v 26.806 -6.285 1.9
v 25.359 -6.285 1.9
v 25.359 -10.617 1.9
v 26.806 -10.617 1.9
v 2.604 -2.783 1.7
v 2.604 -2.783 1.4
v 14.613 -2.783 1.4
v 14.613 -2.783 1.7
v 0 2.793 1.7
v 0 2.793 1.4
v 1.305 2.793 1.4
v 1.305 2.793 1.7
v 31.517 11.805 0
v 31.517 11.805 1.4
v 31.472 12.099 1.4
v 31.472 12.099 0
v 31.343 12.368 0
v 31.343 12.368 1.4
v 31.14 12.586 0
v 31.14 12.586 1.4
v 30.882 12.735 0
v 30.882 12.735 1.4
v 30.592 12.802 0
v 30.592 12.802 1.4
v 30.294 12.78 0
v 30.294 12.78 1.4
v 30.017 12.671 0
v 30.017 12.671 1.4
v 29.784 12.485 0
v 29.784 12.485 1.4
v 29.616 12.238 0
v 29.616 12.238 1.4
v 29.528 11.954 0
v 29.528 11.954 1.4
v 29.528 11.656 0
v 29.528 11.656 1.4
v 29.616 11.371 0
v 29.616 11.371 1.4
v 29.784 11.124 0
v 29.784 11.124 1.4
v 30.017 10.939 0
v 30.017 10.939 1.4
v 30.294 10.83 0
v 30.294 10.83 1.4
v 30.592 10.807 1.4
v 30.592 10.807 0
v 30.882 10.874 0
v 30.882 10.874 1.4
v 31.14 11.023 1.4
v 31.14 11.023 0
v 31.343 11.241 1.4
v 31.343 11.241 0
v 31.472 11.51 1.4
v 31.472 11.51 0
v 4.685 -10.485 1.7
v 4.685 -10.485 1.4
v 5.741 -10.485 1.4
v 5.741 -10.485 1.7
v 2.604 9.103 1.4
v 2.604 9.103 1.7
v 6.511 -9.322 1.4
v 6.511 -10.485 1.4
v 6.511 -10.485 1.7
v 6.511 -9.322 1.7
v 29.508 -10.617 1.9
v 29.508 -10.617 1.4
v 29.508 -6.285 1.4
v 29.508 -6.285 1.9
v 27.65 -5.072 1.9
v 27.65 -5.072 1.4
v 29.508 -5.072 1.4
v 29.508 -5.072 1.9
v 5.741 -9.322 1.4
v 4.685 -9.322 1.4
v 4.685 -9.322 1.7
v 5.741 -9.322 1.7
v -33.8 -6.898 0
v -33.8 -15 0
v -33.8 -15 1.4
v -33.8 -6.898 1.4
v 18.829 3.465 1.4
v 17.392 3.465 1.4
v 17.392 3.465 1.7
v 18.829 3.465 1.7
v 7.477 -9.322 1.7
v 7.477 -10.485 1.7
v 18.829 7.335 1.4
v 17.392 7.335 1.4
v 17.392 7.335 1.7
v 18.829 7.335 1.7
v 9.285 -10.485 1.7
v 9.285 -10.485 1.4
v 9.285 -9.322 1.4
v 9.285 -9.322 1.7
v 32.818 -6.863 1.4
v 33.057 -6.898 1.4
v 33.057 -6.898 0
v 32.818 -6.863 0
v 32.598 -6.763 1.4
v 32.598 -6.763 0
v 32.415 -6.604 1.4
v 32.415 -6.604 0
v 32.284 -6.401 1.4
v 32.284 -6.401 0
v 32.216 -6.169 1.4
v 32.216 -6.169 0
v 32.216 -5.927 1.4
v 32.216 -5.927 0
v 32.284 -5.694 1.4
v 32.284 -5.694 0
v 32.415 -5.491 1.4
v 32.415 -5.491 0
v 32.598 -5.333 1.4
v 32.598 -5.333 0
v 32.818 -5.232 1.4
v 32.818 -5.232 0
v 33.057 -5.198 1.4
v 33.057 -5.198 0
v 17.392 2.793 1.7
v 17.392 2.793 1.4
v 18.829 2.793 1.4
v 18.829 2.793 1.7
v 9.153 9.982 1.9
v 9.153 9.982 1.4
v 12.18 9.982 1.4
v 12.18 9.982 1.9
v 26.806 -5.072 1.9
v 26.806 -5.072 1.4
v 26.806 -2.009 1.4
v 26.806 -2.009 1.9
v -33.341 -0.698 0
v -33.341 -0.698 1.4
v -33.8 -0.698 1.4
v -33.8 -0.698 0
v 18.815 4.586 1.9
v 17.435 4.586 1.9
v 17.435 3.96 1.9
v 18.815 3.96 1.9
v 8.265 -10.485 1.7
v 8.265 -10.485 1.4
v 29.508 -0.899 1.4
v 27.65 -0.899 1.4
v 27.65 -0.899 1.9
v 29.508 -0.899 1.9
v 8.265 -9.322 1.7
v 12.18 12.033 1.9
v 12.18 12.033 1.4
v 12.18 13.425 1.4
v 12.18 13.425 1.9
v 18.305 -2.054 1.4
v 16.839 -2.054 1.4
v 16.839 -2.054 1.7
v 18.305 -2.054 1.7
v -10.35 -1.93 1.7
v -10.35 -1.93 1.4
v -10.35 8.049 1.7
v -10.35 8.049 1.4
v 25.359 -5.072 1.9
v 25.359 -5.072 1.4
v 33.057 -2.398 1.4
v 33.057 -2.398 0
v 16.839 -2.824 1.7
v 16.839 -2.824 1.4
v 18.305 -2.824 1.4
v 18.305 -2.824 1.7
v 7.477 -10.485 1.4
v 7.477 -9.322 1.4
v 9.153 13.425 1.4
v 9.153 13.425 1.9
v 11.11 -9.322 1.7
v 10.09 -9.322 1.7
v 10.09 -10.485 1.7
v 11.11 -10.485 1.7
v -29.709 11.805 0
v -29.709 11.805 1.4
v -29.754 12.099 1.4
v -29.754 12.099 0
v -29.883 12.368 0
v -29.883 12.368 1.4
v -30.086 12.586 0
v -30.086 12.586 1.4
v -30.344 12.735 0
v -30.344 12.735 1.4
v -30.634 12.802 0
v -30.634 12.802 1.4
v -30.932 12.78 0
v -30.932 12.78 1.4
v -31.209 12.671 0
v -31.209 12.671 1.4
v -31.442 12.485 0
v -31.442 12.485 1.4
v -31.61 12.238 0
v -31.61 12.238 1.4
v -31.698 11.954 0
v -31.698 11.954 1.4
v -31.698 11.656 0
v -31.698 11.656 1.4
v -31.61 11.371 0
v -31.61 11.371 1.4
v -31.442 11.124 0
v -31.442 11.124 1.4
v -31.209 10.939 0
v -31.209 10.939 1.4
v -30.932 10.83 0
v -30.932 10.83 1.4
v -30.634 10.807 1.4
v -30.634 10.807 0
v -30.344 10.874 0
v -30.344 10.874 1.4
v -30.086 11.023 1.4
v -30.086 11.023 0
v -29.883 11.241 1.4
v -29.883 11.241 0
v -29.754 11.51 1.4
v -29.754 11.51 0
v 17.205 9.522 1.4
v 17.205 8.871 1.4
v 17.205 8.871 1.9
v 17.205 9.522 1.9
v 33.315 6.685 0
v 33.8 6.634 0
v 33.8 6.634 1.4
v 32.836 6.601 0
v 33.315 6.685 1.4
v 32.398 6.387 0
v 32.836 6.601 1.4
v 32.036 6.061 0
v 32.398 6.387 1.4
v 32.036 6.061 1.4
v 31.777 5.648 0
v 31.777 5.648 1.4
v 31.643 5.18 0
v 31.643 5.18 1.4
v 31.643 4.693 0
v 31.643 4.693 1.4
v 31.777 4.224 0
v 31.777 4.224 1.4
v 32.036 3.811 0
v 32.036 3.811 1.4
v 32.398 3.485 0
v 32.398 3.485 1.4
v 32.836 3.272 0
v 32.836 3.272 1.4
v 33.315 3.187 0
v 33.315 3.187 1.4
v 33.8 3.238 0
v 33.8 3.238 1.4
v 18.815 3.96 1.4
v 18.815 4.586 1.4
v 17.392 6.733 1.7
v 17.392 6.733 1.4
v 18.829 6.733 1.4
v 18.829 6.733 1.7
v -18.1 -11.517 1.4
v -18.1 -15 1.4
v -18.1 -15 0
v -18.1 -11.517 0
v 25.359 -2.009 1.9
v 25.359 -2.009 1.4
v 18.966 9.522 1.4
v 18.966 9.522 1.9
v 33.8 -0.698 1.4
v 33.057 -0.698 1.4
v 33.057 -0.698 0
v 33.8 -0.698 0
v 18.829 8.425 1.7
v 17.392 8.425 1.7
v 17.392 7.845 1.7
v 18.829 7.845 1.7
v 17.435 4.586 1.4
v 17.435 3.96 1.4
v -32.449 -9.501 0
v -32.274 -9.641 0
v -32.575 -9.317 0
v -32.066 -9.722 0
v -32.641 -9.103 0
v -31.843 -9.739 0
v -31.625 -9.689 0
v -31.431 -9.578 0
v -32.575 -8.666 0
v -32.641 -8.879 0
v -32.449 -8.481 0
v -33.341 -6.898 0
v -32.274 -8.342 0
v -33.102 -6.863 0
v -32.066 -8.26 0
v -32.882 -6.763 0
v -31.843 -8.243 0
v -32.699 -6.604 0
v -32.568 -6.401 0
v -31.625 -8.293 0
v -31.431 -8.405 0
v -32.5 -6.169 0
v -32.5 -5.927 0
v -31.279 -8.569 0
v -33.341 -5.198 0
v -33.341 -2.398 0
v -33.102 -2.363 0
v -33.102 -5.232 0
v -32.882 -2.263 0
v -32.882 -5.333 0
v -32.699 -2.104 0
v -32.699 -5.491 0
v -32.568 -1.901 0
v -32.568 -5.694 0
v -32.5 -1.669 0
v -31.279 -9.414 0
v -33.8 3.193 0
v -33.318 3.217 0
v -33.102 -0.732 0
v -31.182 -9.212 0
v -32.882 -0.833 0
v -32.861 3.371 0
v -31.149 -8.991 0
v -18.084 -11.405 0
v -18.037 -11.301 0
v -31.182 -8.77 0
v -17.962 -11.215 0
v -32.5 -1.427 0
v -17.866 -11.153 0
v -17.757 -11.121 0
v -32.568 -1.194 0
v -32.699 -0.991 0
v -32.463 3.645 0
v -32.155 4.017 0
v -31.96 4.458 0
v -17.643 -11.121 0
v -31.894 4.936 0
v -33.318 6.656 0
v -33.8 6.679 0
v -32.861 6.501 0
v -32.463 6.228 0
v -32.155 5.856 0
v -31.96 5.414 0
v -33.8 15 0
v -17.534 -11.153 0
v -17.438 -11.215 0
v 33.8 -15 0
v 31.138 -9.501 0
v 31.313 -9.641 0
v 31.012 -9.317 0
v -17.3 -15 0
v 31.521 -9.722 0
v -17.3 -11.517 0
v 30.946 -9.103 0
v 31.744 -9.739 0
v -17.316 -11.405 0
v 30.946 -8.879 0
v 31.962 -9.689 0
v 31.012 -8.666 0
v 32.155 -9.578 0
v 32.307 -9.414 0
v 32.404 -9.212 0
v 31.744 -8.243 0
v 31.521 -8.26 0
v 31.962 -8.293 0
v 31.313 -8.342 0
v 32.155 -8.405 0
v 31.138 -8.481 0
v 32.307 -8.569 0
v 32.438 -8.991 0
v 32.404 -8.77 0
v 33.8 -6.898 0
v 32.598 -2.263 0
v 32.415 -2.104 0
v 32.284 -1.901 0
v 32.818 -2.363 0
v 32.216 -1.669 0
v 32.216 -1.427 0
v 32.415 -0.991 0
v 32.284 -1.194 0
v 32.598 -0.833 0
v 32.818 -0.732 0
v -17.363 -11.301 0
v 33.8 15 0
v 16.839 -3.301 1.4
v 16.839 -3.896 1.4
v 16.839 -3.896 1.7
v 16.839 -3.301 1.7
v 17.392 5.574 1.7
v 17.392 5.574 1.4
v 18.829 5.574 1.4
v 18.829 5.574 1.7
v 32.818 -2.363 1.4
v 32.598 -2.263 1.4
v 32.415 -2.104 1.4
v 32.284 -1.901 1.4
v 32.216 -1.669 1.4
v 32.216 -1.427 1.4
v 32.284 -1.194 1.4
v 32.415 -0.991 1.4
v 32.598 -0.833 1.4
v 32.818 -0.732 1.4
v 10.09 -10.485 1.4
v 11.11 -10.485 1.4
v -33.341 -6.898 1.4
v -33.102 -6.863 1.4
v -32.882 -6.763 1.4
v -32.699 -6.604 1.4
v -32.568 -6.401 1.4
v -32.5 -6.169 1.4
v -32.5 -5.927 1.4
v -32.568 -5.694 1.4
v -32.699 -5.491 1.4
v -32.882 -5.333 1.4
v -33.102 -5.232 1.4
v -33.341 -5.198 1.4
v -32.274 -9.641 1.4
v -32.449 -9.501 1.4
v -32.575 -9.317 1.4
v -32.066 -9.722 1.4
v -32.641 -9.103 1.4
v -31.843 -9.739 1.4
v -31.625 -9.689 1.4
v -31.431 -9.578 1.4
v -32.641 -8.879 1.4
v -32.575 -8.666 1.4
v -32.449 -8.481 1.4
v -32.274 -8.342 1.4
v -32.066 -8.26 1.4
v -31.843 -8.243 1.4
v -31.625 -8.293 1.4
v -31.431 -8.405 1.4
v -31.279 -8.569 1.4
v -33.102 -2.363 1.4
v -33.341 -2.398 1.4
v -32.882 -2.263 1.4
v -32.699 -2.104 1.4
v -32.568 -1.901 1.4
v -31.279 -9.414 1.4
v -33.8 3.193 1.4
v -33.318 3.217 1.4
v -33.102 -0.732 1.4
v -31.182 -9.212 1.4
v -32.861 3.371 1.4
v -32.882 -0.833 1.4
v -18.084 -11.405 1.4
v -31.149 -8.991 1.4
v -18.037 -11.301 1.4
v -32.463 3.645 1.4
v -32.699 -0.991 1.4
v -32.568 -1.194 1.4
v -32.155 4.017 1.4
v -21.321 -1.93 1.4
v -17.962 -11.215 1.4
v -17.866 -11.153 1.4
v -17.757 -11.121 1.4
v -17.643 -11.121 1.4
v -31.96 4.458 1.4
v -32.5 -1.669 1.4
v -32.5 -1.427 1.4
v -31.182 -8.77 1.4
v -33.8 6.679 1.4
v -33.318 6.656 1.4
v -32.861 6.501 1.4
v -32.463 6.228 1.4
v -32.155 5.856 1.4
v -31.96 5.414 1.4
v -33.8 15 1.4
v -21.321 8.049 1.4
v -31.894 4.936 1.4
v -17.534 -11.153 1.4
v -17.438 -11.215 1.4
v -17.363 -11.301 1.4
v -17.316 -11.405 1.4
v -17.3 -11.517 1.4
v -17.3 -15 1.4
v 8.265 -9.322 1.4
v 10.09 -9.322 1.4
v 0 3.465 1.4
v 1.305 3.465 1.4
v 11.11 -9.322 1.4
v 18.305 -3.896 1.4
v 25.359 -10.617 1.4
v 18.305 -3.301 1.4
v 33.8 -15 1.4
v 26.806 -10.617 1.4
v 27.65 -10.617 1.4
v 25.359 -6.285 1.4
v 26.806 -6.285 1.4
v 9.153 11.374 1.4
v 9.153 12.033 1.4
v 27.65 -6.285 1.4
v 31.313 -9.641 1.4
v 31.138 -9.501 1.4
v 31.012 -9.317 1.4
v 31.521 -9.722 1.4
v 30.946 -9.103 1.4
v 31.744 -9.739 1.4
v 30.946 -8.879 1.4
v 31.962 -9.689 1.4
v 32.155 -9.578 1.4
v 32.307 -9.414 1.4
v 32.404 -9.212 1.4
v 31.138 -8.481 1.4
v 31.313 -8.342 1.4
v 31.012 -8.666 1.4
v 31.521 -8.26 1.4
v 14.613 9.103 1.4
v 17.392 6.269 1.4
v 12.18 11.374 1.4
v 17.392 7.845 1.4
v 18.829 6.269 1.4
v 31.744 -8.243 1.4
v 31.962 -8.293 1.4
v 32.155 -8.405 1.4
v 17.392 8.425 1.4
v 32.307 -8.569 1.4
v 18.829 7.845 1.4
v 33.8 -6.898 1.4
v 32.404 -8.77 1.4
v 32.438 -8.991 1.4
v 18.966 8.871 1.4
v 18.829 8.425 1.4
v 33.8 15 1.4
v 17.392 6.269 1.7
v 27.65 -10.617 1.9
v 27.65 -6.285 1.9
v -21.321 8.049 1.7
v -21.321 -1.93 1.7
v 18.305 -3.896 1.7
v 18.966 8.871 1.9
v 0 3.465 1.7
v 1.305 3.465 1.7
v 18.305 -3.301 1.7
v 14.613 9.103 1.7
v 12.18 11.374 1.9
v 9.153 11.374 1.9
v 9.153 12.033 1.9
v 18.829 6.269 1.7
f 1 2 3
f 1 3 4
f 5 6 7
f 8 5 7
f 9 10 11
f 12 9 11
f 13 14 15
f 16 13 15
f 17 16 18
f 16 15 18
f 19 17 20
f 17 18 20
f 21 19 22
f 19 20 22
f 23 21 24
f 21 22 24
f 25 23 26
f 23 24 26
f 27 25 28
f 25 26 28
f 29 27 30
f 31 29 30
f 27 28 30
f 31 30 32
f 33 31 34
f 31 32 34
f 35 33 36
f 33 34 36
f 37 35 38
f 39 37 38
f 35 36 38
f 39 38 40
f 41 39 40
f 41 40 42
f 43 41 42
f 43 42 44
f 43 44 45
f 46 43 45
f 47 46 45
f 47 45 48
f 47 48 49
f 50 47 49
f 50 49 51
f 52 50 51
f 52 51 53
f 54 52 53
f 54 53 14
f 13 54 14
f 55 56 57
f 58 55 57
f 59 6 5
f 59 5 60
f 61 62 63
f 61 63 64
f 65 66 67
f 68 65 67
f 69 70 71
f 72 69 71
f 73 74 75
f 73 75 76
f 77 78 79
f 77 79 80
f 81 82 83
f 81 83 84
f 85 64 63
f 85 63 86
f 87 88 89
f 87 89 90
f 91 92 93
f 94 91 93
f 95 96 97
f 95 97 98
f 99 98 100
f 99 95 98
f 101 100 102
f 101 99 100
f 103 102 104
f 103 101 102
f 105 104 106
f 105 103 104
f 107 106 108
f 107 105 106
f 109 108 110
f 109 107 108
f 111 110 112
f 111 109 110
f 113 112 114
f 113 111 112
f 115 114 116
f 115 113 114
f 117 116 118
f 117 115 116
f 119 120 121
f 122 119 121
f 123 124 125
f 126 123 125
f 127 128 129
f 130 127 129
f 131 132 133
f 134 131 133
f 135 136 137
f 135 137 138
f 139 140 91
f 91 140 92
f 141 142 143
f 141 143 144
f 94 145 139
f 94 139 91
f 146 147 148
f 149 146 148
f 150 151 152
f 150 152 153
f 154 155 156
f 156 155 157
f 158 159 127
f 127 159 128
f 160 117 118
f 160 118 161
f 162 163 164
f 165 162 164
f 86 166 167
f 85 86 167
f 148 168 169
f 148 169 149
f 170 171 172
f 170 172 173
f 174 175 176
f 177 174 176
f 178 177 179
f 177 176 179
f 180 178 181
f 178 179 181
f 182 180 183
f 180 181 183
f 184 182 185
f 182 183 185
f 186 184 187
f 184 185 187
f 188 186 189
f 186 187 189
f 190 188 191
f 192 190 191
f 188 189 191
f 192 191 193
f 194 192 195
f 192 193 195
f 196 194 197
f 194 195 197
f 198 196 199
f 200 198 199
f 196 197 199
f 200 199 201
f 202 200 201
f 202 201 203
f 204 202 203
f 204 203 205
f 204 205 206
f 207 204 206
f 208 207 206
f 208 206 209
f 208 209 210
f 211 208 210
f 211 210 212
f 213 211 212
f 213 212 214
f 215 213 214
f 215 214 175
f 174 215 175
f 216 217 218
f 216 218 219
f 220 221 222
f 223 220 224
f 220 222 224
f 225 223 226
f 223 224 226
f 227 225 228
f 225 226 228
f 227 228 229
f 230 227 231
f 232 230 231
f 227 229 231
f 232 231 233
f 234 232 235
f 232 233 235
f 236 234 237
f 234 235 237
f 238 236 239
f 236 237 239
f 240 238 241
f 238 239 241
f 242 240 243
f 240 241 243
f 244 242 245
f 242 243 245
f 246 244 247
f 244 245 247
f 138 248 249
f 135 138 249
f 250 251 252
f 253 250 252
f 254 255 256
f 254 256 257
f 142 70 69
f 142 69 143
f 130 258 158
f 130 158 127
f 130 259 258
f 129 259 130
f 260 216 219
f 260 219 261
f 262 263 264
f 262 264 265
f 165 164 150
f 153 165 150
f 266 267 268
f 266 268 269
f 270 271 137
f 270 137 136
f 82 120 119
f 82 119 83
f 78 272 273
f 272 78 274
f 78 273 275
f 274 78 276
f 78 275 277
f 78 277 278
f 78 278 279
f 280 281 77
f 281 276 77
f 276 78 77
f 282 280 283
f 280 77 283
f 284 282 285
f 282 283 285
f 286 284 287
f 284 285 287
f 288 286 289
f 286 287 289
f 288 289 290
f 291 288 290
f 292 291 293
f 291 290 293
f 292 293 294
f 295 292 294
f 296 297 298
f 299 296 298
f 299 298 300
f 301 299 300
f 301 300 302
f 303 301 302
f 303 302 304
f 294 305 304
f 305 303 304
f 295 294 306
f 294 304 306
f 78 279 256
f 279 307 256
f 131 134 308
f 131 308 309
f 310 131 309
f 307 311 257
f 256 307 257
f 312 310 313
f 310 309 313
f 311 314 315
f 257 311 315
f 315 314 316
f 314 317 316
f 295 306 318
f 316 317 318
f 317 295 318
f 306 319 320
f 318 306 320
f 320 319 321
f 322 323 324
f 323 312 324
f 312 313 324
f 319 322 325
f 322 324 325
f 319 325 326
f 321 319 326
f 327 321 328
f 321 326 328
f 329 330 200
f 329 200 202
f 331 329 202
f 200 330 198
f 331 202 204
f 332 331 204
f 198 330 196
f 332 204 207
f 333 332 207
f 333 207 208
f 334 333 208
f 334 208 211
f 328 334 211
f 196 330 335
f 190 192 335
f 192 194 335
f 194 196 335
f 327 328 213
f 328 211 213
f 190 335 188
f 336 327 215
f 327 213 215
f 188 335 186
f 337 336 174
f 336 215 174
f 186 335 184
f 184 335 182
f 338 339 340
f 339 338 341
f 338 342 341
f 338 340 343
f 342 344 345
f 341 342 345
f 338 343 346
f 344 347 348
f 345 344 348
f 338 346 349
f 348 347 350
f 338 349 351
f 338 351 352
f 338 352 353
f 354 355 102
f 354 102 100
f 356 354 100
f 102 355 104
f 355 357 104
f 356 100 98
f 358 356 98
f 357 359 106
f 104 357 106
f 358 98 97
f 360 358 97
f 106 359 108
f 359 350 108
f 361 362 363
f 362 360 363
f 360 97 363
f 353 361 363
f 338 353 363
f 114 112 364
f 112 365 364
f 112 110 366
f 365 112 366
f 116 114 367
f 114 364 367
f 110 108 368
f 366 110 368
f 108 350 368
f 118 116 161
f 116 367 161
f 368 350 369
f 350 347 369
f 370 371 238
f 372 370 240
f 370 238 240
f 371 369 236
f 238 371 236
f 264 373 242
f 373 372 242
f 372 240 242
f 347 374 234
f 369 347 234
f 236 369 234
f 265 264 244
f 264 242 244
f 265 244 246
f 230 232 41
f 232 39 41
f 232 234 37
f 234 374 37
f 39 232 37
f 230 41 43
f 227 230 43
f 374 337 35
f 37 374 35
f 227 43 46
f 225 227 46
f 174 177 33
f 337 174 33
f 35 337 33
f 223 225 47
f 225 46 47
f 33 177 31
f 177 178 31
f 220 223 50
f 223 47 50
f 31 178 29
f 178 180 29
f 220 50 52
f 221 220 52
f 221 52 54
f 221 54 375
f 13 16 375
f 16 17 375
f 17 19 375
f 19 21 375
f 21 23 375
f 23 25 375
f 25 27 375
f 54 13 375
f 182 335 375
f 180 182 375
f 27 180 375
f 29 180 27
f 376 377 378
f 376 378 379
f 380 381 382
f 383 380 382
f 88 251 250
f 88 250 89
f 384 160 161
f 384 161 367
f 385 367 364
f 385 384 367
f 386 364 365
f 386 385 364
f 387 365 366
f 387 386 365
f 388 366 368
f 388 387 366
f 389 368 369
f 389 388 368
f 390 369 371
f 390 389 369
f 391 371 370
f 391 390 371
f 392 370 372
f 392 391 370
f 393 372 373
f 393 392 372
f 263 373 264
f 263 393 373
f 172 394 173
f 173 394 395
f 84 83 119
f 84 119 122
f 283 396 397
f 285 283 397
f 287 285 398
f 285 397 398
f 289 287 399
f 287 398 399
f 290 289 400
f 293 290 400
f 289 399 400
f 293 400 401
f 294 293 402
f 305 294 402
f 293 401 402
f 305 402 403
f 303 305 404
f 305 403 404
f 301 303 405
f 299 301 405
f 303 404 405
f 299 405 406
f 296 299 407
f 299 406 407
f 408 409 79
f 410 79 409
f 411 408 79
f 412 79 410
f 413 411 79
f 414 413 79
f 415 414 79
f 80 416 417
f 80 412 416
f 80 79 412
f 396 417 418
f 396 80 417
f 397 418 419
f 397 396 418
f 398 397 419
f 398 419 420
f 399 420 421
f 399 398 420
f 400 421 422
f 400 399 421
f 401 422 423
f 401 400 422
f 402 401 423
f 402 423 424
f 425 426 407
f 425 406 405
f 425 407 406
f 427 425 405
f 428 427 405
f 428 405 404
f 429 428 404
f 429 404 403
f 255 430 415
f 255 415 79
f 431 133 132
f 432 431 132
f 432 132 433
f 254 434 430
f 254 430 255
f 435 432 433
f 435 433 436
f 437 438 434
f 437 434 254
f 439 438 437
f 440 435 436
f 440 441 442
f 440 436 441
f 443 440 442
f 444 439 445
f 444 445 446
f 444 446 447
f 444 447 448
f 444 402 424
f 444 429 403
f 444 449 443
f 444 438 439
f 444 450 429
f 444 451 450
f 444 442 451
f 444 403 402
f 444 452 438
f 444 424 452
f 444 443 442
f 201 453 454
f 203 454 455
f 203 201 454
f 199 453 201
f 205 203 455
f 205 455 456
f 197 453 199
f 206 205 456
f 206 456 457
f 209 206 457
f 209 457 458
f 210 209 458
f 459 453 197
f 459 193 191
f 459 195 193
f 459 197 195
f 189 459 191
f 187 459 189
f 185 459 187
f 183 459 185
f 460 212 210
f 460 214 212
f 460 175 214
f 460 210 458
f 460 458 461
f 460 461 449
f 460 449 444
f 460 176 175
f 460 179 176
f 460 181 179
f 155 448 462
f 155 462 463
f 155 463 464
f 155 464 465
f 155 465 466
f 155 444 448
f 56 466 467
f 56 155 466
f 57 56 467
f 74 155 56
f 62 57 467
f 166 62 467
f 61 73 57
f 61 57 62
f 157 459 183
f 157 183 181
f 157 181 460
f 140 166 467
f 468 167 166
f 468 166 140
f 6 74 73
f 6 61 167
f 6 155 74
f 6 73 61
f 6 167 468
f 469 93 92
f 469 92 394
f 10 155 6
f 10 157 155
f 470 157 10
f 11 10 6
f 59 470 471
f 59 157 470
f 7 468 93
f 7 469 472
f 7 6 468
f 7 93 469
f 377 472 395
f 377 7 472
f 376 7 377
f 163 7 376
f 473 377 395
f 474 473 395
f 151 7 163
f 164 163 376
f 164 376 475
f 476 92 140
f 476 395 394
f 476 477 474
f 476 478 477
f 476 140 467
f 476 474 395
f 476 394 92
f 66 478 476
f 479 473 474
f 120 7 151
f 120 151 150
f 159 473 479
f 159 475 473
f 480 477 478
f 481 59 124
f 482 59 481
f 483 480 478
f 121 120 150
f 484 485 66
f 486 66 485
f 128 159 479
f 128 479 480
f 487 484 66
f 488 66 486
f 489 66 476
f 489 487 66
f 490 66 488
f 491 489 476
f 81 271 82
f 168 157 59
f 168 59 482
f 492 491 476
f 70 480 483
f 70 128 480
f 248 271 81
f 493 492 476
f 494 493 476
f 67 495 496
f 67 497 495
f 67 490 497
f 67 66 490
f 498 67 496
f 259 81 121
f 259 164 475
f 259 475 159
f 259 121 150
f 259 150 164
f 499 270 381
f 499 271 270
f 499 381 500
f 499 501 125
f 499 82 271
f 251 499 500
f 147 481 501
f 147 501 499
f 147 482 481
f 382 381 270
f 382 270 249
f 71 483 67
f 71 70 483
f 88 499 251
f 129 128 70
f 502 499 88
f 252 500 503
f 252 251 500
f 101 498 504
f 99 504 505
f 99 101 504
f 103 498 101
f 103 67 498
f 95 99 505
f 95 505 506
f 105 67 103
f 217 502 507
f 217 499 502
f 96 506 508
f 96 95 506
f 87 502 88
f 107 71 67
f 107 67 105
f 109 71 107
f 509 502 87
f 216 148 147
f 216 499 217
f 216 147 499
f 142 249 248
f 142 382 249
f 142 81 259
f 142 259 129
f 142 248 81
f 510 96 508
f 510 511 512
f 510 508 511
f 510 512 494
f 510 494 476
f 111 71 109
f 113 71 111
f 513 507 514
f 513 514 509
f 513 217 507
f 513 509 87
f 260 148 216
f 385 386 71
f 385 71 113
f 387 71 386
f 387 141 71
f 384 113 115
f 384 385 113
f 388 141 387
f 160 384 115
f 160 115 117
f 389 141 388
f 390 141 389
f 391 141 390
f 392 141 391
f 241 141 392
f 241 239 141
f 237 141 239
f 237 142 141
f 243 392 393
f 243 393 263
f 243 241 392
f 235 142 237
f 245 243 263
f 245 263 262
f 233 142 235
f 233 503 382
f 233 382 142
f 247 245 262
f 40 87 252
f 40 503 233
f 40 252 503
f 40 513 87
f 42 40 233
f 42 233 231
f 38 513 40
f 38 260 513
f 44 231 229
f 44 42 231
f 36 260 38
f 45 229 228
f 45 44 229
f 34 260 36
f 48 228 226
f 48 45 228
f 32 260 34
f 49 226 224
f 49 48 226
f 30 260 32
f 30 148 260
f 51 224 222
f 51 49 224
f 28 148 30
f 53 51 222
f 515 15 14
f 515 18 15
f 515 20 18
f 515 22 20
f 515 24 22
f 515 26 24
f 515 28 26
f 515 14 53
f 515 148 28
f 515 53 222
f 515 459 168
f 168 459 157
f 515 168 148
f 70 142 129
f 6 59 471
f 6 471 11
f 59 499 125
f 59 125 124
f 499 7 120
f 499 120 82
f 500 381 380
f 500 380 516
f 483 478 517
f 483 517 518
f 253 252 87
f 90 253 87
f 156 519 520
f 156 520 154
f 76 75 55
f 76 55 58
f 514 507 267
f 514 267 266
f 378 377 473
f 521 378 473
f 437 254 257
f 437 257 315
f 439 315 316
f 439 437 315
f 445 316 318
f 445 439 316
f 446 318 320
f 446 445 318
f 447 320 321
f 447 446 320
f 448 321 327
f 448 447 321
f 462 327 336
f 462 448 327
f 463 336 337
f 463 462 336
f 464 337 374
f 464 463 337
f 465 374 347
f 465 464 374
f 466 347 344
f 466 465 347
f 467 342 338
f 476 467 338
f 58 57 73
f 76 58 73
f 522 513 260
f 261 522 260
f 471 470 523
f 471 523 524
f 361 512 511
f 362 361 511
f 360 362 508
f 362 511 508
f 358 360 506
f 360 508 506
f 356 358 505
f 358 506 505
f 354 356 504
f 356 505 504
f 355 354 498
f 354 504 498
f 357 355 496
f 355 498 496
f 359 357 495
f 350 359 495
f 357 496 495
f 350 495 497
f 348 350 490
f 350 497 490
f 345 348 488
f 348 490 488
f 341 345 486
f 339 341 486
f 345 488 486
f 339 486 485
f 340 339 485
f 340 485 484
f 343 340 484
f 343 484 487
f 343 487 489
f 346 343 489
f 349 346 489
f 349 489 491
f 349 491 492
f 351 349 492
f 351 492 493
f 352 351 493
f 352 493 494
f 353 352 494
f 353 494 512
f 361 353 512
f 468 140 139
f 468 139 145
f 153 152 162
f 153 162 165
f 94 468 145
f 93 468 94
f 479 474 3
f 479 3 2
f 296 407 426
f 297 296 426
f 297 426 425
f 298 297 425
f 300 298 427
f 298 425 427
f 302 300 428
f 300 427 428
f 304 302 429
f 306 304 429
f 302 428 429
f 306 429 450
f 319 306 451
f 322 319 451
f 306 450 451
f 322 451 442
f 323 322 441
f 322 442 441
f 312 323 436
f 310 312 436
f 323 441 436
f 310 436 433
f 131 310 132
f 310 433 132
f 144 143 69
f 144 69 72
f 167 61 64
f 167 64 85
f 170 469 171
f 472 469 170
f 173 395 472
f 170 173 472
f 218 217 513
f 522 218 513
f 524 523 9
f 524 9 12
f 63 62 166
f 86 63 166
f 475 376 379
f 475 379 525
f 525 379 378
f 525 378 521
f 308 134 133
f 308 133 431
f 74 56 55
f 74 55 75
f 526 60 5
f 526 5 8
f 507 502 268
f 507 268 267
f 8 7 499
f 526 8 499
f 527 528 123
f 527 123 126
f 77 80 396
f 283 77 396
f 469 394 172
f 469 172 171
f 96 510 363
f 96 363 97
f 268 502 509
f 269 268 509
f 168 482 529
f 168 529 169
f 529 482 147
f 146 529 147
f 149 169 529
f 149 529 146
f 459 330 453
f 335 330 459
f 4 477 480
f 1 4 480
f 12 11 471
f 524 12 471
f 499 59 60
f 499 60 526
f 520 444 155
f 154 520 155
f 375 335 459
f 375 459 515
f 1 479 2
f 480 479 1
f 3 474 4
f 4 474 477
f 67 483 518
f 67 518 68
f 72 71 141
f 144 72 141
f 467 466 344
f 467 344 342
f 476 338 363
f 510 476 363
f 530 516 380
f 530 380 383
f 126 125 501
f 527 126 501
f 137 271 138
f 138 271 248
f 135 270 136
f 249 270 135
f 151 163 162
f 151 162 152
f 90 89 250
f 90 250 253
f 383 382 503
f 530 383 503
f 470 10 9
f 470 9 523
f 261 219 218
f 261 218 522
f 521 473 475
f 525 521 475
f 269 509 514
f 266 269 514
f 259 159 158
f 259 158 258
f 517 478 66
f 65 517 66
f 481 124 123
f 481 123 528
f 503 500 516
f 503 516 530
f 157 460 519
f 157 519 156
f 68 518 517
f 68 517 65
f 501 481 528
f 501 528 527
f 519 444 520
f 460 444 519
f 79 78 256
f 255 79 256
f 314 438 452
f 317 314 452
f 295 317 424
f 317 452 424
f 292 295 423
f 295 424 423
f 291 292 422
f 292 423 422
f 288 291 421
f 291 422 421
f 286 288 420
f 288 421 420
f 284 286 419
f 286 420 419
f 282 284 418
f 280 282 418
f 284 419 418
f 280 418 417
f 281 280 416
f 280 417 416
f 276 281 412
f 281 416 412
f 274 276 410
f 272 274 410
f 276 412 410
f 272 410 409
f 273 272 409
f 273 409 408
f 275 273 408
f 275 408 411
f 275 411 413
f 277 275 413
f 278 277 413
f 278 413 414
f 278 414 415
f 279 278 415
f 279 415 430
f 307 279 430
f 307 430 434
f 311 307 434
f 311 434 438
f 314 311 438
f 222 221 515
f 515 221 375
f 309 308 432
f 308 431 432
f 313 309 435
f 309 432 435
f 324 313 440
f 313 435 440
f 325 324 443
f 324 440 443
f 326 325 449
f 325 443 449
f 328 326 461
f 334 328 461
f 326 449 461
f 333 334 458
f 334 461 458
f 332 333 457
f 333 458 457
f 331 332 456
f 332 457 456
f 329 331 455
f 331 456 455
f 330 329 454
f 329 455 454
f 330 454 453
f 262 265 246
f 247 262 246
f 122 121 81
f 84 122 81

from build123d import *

# Parameters (mm, degrees)
SKETCH1_W         = 67.6
SKETCH1_H         = 30
SUBSTRATE_DEPTH   = 1.4
SKETCH2_R         = 1
SKETCH2_R_2       = 0.75
SKETCH2_R_3       = 1.75
CUTOUTS_DEPTH     = 2
SKETCH3_W         = 12.009016129
SKETCH3_H         = 11.886366808
SKETCH3_W_2       = 10.970861006
SKETCH3_H_2       = 9.979144757
CHIPS_DEPTH       = 0.3
SKETCH4_W         = 3.027468224
SKETCH4_H         = 1.391658781
SKETCH4_H_2       = 1.39165878
SKETCH4_W_2       = 1.760997679
SKETCH4_H_3       = 0.651327909
SKETCH4_W_3       = 1.447395353
SKETCH4_H_4       = 3.063653498
SKETCH4_W_4       = 1.857490704
SKETCH4_H_5       = 4.173323269
SKETCH4_H_6       = 4.331448702
SKETCH4_W_5       = 1.380452242
SKETCH4_H_7       = 0.625805016
CAPACITORS_DEPTH  = 0.5
SKETCH5_W         = 1.436881646
SKETCH5_H         = 0.57938776
SKETCH5_H_2       = 0.602563271
SKETCH5_H_3       = 0.695265312
SKETCH5_H_4       = 0.672089802
SKETCH5_W_2       = 1.465504975
SKETCH5_H_5       = 0.595361396
SKETCH5_W_3       = 1.305099019
SKETCH5_H_6       = 0.770620802
RESISTORS_DEPTH   = 0.3
SKETCH6_W         = 1.05591146
SKETCH6_H         = 1.163292287
SKETCH6_W_2       = 0.966427438
SKETCH6_W_3       = 1.020117852
SKETCH6_W_4       = 1.020117851
L_COMPONENT_DEPTH = 0.3


with BuildPart() as part:
    # Sketch1 → Substrate (new body)
    with BuildSketch(Plane.XY):
        Rectangle(SKETCH1_W, SKETCH1_H)
    extrude(amount=SUBSTRATE_DEPTH)

    # Sketch2 → Cutouts (cut)
    with BuildSketch(Plane.XY.offset(1.4)):
        with Locations((-30.709168608, 11.804578588)):
            Circle(SKETCH2_R)
        with Locations((30.516911038, 11.804578588)):
            Circle(SKETCH2_R)
        with Locations((31.687531572, -8.991184565)):
            Circle(SKETCH2_R_2)
        with Locations((-31.899083746, -8.991184565)):
            Circle(SKETCH2_R_2)
        with Locations((-33.643638543, 4.936384587)):
            Circle(SKETCH2_R_3)
        with Locations((33.376123728, 4.936384587)):
            Circle(SKETCH2_R_3)
        with BuildLine():
            Line((-18.1, -15), (-18.1, -11.517203937))
            ThreePointArc((-18.1, -11.517203937), (-17.7, -11.117203937), (-17.3, -11.517203937))
            Line((-17.3, -11.517203937), (-17.3, -15))
            Line((-17.3, -15), (-18.1, -15))
        make_face()
        with BuildLine():
            Line((33.057190194, -0.69758335), (34.638090789, -0.69758335))
            Line((34.638090789, -0.69758335), (34.710836401, -6.89758335))
            Line((34.710836401, -6.89758335), (33.057190194, -6.89758335))
            ThreePointArc((33.057190194, -6.89758335), (32.207190194, -6.04758335), (33.057190194, -5.19758335))
            Line((33.057190194, -5.19758335), (33.057190194, -2.39758335))
            ThreePointArc((33.057190194, -2.39758335), (32.207190194, -1.54758335), (33.057190194, -0.69758335))
        make_face()
        with BuildLine():
            Line((-33.341181022, -5.19758335), (-33.341181022, -2.39758335))
            ThreePointArc((-33.341181022, -2.39758335), (-32.491181022, -1.54758335), (-33.341181022, -0.69758335))
            Line((-33.341181022, -0.69758335), (-34.347477131, -0.69758335))
            Line((-34.347477131, -0.69758335), (-34.347477131, -6.89758335))
            Line((-34.347477131, -6.89758335), (-33.341181022, -6.89758335))
            ThreePointArc((-33.341181022, -6.89758335), (-32.491181022, -6.04758335), (-33.341181022, -5.19758335))
        make_face()
    extrude(amount=-CUTOUTS_DEPTH, mode=Mode.SUBTRACT)

    # Sketch3 → Chips (add)
    with BuildSketch(Plane.XY.offset(1.4)):
        with Locations((8.608474284, 3.159777946)):
            Rectangle(SKETCH3_W, SKETCH3_H)
        with Locations((-15.835757789, 3.059690457)):
            Rectangle(SKETCH3_W_2, SKETCH3_H_2)
    extrude(amount=CHIPS_DEPTH)

    # Sketch4 → Capacitors (add)
    with BuildSketch(Plane.XY.offset(1.4)):
        with Locations((10.666269416, 12.728744546)):
            Rectangle(SKETCH4_W, SKETCH4_H)
        with Locations((10.666269416, 10.677878974)):
            Rectangle(SKETCH4_W, SKETCH4_H_2)
        with Locations((18.085628066, 9.196485107)):
            Rectangle(SKETCH4_W_2, SKETCH4_H_3)
        with Locations((26.082487394, -3.540594003)):
            Rectangle(SKETCH4_W_3, SKETCH4_H_4)
        with Locations((28.579244378, -2.985759118)):
            Rectangle(SKETCH4_W_4, SKETCH4_H_5)
        with Locations((28.579244378, -8.450852566)):
            Rectangle(SKETCH4_W_4, SKETCH4_H_6)
        with Locations((26.082487394, -8.450852566)):
            Rectangle(SKETCH4_W_3, SKETCH4_H_6)
        with Locations((18.124891861, 4.272795947)):
            Rectangle(SKETCH4_W_5, SKETCH4_H_7)
    extrude(amount=CAPACITORS_DEPTH)

    # Sketch5 → Resistors (add)
    with BuildSketch(Plane.XY.offset(1.4)):
        with Locations((18.11021309, 8.134894019)):
            Rectangle(SKETCH5_W, SKETCH5_H)
        with Locations((18.11021309, 7.034057275)):
            Rectangle(SKETCH5_W, SKETCH5_H_2)
        with Locations((18.11021309, 5.921632774)):
            Rectangle(SKETCH5_W, SKETCH5_H_3)
        with Locations((18.11021309, 3.128983768)):
            Rectangle(SKETCH5_W, SKETCH5_H_4)
        with Locations((17.571973081, -3.598556709)):
            Rectangle(SKETCH5_W_2, SKETCH5_H_5)
        with Locations((0.65254951, 3.128983768)):
            Rectangle(SKETCH5_W_3, SKETCH5_H_4)
        with Locations((17.571973081, -2.438862849)):
            Rectangle(SKETCH5_W_2, SKETCH5_H_6)
    extrude(amount=RESISTORS_DEPTH)

    # Sketch6 → L Component (add)
    with BuildSketch(Plane.XY.offset(1.4)):
        with Locations((5.21332261, -9.903818455)):
            Rectangle(SKETCH6_W, SKETCH6_H)
        with Locations((6.994054649, -9.903818455)):
            Rectangle(SKETCH6_W_2, SKETCH6_H)
        with Locations((8.774786688, -9.903818455)):
            Rectangle(SKETCH6_W_3, SKETCH6_H)
        with Locations((10.600260739, -9.903818455)):
            Rectangle(SKETCH6_W_4, SKETCH6_H)
    extrude(amount=L_COMPONENT_DEPTH)


solid = part.part
